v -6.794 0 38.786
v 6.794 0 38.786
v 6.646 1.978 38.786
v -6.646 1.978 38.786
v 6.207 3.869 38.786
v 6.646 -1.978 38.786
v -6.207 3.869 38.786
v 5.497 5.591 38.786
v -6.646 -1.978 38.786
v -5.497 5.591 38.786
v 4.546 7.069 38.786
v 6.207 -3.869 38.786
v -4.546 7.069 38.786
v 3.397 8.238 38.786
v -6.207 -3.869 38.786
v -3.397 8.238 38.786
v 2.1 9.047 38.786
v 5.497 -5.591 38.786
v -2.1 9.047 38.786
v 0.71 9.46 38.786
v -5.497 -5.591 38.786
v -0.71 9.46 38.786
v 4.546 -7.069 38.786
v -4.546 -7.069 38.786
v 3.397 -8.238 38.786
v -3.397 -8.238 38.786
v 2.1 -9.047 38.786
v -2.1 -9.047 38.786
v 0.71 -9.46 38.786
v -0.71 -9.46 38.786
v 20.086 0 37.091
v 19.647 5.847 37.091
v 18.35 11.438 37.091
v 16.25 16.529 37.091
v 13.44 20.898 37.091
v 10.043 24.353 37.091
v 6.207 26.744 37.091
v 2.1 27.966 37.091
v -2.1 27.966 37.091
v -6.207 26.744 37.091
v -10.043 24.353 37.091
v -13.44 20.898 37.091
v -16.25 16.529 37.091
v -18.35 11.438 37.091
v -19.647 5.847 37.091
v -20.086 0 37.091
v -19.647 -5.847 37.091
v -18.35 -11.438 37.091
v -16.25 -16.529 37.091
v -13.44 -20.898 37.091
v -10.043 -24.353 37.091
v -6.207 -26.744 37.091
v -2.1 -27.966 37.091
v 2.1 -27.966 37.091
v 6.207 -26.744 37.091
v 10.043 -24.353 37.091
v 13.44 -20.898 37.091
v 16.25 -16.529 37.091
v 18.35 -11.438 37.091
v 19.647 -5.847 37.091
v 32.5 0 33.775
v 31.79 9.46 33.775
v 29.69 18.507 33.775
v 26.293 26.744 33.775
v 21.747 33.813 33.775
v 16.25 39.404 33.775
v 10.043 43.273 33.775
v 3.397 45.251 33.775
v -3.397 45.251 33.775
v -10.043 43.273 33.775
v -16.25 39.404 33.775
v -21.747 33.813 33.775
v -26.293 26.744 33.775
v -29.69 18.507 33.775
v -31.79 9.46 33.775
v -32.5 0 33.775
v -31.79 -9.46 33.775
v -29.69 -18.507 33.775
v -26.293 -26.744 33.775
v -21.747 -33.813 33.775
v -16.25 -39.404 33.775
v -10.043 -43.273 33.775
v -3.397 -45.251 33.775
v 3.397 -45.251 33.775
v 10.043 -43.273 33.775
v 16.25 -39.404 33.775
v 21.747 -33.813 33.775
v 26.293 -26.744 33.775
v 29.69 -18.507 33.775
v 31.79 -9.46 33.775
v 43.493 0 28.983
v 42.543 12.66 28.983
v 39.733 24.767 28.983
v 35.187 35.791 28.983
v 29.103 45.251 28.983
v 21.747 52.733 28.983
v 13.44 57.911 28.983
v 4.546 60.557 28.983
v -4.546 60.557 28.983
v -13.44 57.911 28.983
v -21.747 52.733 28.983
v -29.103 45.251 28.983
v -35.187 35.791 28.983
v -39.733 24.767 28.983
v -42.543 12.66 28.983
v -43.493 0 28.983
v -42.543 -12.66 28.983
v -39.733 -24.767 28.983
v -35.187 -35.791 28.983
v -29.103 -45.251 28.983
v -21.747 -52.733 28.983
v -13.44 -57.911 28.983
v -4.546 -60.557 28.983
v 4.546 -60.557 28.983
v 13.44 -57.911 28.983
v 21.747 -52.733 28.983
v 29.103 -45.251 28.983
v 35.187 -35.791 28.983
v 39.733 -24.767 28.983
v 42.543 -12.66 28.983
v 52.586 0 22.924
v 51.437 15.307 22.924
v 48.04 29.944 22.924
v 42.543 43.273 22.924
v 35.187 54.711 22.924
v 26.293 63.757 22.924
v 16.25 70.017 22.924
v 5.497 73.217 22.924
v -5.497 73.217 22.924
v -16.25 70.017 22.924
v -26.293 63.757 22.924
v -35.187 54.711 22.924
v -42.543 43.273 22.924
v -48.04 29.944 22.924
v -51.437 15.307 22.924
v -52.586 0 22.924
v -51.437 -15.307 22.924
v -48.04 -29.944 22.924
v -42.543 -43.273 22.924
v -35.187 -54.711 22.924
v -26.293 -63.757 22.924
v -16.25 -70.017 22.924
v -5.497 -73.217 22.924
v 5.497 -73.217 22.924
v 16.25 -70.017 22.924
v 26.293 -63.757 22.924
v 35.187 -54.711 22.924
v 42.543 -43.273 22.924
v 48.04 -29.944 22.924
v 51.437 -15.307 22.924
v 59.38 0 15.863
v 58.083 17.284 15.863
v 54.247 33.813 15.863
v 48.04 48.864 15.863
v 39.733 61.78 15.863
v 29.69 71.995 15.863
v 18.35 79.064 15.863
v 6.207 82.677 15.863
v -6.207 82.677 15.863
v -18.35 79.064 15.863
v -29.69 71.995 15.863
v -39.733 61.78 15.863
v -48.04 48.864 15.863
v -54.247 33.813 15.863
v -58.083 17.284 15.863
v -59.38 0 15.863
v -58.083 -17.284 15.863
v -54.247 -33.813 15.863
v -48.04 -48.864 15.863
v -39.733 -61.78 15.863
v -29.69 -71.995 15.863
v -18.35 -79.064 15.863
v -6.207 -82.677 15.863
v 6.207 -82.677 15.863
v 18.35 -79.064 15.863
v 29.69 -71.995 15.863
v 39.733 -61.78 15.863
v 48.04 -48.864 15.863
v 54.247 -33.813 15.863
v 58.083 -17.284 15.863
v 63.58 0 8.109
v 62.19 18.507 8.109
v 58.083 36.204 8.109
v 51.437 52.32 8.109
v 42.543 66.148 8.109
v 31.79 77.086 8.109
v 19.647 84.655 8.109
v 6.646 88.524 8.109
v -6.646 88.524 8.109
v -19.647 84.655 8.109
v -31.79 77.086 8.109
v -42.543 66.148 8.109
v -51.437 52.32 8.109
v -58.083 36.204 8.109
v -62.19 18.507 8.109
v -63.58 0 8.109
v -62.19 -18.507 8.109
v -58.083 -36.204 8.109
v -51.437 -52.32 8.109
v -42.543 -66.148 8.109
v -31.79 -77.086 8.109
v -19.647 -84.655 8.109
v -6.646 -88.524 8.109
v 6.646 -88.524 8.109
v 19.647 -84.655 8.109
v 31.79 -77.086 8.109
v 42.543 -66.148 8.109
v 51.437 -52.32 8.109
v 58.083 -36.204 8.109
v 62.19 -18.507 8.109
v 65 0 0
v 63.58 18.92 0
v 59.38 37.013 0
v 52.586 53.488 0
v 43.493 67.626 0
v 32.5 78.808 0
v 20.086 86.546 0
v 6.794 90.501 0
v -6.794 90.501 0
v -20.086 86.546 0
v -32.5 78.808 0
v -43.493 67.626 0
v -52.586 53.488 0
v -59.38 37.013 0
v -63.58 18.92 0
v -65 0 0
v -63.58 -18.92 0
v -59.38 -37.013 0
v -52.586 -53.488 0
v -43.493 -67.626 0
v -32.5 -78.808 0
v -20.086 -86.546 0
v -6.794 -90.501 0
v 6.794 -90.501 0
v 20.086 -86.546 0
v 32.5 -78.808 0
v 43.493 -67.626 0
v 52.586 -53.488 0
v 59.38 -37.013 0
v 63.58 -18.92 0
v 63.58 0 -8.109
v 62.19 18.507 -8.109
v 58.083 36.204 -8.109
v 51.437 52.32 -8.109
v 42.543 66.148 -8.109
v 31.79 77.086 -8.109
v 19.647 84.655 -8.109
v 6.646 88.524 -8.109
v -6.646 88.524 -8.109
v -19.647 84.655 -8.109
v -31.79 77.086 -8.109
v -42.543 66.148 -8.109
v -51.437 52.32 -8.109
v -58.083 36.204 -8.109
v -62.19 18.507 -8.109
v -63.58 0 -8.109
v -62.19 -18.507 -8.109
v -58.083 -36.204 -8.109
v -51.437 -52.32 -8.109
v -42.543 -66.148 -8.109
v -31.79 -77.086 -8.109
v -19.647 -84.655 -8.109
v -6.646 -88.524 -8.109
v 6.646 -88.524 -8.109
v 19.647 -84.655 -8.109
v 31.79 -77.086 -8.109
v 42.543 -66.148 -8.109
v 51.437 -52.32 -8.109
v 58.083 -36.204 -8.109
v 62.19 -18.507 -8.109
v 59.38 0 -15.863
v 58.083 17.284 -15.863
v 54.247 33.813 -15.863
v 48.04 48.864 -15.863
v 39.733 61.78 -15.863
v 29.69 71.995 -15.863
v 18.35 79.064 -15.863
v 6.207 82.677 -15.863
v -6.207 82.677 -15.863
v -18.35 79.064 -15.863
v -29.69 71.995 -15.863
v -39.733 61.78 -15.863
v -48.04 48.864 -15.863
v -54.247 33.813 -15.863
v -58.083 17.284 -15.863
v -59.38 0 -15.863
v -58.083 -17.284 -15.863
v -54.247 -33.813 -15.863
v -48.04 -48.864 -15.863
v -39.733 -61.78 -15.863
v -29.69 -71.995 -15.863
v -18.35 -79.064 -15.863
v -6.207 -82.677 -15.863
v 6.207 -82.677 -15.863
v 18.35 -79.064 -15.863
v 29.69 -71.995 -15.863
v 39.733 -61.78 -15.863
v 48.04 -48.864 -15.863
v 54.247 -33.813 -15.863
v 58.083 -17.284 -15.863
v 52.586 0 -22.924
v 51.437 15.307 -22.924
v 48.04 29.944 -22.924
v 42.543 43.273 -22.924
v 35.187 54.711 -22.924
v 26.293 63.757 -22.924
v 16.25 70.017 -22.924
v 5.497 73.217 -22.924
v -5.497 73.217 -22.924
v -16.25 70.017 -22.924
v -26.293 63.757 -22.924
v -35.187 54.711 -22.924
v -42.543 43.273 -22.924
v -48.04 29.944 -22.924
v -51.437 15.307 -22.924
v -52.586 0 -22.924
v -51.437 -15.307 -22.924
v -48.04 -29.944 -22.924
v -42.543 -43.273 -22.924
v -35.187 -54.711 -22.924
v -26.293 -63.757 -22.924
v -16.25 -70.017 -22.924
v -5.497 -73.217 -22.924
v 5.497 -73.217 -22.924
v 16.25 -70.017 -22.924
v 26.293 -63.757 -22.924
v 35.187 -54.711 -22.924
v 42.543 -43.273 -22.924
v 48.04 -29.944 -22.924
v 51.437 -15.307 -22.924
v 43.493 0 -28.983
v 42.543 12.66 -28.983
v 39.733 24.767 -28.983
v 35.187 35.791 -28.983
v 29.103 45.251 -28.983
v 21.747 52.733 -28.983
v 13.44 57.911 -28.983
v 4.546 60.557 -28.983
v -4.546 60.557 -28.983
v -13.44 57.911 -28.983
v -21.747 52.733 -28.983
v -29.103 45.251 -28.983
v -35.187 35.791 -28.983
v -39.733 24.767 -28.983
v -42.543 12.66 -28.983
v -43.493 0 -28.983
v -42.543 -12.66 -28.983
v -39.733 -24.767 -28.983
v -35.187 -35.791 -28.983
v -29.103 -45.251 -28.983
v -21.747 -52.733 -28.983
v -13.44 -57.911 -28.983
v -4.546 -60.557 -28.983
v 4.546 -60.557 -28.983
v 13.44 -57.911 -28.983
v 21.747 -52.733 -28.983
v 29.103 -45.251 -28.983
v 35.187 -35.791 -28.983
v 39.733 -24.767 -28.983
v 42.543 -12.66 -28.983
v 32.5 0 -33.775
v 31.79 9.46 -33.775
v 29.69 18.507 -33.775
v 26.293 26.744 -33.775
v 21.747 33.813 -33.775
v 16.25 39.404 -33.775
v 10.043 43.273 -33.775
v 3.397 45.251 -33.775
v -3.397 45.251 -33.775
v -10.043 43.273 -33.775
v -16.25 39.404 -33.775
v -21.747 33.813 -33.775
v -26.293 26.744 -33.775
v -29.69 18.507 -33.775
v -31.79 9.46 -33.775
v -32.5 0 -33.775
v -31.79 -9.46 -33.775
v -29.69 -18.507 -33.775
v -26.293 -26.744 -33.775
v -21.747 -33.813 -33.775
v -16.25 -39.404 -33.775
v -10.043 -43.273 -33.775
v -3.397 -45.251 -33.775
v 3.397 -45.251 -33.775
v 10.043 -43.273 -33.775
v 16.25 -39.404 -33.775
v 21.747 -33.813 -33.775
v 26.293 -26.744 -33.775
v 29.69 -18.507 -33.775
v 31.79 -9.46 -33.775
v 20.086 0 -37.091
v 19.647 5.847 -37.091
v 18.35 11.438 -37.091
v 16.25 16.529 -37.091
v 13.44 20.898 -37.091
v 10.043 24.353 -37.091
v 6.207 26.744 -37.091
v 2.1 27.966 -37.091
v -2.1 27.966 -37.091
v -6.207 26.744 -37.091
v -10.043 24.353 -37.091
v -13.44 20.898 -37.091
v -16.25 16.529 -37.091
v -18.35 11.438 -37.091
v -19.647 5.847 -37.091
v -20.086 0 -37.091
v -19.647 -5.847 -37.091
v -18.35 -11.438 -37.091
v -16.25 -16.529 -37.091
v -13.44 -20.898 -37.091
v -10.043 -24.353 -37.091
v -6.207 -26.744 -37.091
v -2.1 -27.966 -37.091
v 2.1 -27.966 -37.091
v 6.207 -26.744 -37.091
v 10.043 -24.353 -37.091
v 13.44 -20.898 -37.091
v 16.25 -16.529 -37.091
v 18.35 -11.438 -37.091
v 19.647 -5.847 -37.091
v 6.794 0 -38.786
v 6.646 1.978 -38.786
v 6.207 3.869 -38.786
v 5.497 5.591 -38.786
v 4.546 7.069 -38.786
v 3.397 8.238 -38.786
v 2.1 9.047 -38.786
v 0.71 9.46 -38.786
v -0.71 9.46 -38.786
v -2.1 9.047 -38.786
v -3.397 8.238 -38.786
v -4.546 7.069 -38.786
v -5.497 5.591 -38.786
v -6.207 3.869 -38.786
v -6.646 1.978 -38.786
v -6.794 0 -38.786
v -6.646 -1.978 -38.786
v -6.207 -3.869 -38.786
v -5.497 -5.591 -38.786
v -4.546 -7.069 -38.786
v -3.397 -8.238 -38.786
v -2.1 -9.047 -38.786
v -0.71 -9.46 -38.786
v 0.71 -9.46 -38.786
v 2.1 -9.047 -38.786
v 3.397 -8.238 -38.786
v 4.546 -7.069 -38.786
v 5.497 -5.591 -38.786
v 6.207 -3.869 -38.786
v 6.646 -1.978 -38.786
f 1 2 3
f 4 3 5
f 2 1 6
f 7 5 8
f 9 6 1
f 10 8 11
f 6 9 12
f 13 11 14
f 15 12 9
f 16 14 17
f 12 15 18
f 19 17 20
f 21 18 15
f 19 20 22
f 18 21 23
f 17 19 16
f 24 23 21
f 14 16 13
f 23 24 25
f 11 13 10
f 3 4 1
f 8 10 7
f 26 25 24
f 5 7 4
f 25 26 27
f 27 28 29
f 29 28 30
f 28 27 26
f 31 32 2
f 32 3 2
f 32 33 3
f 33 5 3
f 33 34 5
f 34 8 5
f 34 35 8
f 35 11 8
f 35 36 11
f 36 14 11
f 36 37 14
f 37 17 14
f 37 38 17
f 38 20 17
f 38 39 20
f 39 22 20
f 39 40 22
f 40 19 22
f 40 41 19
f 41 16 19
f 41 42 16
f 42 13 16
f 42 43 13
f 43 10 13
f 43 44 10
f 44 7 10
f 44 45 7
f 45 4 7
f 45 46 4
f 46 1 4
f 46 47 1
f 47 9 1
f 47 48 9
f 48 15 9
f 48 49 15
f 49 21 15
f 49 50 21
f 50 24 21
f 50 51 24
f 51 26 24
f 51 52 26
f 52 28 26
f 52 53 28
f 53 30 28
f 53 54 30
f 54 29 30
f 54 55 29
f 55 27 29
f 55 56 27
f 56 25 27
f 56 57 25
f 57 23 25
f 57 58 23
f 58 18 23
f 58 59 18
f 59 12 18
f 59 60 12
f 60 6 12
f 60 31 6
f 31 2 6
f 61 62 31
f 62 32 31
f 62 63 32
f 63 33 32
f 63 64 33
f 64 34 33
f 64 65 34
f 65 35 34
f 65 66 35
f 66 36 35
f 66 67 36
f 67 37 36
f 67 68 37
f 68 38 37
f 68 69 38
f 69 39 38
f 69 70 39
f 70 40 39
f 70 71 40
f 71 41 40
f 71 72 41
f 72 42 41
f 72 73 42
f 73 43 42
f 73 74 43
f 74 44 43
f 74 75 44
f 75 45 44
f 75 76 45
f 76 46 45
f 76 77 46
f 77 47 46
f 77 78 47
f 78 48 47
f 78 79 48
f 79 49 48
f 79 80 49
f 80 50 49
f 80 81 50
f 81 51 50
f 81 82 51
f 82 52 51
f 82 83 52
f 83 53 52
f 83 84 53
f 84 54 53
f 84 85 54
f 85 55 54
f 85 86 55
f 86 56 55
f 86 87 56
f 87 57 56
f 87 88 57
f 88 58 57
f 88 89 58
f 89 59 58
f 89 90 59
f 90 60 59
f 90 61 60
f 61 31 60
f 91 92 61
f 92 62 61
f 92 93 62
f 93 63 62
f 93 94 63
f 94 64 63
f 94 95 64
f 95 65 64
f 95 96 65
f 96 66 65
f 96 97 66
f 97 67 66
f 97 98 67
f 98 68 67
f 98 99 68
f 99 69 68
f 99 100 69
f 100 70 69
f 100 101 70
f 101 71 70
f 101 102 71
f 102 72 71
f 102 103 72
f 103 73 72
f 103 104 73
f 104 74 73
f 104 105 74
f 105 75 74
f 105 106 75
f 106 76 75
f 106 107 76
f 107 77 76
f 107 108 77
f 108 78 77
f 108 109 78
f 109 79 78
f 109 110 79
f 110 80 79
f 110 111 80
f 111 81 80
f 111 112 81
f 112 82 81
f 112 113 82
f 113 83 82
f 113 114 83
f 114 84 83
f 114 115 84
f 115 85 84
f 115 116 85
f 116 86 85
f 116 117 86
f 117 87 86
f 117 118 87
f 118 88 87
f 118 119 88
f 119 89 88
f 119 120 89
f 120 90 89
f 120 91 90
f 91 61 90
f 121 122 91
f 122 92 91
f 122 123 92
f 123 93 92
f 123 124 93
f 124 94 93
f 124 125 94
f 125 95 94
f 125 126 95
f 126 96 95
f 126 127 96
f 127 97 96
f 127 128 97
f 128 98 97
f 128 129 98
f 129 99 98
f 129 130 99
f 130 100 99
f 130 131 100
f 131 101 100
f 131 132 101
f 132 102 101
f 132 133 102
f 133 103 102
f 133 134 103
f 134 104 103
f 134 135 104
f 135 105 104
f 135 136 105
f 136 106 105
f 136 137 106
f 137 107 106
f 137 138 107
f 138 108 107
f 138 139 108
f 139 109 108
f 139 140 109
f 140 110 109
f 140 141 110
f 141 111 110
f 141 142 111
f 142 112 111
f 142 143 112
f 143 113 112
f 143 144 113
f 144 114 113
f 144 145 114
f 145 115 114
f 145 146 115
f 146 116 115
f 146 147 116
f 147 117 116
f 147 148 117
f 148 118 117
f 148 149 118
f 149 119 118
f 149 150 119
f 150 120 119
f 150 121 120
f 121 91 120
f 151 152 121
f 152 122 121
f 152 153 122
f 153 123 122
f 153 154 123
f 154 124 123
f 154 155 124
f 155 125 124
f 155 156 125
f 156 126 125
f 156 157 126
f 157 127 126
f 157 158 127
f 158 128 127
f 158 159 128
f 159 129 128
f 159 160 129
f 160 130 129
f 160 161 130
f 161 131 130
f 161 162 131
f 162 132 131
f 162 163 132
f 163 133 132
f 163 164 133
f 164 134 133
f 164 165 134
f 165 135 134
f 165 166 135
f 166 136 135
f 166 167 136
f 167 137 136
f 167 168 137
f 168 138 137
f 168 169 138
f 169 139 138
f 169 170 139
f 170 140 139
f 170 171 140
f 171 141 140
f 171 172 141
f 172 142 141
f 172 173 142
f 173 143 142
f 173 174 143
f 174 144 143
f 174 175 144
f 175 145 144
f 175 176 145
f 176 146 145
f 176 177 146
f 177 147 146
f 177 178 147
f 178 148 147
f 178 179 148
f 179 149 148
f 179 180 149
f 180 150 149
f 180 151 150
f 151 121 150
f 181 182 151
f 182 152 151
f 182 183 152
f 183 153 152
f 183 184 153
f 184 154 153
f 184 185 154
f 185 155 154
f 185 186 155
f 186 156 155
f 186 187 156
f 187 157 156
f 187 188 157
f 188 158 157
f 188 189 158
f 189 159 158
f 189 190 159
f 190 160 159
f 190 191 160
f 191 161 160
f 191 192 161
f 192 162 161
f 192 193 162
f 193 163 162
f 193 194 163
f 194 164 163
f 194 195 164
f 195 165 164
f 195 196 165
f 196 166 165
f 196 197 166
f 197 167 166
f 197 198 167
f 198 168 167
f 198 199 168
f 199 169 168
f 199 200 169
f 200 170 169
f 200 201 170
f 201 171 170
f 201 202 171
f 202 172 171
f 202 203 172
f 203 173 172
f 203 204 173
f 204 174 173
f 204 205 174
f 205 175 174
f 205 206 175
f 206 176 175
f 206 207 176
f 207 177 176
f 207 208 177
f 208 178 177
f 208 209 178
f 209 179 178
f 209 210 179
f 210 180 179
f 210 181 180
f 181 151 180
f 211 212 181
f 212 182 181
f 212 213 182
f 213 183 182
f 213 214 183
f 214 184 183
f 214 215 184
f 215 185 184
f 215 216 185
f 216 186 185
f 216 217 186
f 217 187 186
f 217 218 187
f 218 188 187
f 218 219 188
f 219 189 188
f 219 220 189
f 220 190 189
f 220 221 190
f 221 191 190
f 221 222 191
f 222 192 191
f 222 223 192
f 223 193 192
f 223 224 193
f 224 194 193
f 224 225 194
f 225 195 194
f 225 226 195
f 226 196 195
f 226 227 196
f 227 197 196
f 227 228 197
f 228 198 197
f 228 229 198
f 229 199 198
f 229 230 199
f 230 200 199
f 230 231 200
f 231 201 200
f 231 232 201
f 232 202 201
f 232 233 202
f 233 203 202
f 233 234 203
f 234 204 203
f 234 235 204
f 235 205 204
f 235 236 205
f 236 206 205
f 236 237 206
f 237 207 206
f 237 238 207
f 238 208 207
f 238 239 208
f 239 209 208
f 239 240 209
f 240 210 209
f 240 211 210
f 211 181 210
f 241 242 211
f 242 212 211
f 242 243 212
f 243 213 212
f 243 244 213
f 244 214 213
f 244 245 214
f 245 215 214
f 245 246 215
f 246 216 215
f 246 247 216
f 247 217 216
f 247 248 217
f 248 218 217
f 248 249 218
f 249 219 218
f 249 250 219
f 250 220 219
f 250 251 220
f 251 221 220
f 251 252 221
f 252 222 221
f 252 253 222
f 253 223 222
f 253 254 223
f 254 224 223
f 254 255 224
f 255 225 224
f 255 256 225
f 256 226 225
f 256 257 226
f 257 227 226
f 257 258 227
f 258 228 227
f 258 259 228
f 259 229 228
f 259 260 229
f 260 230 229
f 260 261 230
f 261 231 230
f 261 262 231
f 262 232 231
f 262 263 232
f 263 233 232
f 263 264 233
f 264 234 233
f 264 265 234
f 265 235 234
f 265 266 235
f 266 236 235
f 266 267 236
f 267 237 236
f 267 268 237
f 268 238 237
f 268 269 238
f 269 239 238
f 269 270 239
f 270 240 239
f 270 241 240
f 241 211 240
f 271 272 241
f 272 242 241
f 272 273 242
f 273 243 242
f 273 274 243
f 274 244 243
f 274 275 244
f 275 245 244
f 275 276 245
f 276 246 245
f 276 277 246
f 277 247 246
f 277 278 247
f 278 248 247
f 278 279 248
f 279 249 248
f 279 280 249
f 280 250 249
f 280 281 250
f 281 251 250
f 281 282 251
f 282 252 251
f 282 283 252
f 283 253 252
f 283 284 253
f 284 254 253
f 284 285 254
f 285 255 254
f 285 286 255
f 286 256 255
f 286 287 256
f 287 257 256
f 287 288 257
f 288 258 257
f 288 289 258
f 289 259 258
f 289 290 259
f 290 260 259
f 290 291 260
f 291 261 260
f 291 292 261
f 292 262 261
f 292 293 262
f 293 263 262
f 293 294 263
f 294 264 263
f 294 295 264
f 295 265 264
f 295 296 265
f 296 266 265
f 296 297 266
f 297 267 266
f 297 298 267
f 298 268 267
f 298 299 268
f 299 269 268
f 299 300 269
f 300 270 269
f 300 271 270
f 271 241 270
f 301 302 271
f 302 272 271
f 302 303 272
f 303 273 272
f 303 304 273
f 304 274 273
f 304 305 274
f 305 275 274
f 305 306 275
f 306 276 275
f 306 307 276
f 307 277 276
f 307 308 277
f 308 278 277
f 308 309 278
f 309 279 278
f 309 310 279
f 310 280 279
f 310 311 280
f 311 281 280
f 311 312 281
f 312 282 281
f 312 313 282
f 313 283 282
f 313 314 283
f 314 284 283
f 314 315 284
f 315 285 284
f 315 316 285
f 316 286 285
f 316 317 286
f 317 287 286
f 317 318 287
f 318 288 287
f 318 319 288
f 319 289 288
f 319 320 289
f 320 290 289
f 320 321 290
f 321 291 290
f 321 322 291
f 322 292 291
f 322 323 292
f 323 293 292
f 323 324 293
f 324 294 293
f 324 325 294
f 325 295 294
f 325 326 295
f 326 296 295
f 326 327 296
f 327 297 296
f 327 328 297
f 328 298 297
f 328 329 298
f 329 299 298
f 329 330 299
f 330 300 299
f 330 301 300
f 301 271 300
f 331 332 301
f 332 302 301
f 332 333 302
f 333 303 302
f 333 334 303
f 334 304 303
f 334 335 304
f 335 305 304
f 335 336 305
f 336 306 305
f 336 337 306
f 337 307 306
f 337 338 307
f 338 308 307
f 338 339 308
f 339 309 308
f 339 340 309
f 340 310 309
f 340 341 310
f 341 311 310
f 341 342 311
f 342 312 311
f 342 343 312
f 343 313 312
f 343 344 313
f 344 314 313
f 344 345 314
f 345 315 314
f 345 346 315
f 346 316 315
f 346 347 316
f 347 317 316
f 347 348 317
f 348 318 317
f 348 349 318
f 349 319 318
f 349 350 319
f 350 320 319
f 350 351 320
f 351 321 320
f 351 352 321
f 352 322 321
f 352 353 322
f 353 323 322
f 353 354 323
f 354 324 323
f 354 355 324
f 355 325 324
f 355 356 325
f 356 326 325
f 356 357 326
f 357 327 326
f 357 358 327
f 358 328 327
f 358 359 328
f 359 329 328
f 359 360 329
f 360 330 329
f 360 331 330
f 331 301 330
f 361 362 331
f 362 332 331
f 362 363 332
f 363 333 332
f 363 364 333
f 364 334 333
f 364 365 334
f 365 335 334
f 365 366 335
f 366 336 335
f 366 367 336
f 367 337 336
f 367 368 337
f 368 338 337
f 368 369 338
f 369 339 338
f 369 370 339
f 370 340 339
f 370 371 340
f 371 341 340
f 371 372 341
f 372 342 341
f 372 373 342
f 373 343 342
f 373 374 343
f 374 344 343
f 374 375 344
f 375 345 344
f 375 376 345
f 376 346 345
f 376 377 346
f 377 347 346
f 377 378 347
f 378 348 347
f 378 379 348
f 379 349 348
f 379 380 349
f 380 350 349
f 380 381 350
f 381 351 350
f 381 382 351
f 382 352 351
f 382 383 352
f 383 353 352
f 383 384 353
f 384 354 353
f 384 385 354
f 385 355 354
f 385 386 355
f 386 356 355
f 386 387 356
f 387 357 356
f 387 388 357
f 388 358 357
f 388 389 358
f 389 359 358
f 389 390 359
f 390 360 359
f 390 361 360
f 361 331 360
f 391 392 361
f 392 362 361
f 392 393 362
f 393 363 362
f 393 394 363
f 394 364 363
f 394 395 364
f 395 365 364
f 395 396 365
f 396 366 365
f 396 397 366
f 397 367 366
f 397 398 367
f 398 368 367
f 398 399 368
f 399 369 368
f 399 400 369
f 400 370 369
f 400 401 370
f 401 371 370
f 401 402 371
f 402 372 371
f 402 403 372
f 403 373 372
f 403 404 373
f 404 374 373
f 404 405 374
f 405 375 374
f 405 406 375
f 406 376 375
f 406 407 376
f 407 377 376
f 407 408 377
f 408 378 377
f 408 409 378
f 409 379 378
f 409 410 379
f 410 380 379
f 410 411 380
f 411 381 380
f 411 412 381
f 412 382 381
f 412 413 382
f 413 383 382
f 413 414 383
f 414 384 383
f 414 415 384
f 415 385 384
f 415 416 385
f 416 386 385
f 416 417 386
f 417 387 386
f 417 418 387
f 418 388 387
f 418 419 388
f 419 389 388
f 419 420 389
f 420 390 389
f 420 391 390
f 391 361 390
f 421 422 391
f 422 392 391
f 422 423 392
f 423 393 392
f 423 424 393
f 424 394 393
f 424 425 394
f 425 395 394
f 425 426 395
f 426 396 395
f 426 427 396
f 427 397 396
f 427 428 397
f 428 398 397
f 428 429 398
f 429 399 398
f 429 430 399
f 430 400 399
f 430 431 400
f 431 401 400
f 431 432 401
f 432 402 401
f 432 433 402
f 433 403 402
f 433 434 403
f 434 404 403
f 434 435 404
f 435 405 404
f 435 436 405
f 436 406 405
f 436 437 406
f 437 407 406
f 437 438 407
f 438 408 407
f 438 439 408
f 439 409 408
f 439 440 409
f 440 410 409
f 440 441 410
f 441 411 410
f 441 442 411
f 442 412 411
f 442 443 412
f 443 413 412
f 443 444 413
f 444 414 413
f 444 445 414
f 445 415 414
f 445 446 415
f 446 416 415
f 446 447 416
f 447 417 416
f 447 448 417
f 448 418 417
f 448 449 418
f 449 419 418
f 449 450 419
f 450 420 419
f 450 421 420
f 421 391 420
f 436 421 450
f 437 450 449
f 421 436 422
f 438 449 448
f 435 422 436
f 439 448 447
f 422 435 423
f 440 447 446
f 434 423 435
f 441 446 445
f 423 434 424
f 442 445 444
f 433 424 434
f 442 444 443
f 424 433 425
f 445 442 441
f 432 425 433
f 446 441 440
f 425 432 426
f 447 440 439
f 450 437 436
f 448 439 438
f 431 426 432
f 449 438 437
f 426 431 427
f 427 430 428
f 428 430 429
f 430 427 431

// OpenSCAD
// Generated by SolidPython 1.0.1 on 2020-07-29 00:46:46


scale(v = [5, 7, 3]) {
	sphere(r = 13);
}
/***********************************************
*********      SolidPython code:      **********
************************************************
 
# import packages: SolidPython
from solid import *
from solid.utils import *
from itertools import chain, combinations, permutations


class Resize:

    def __init__(self, scad_file):
        self.scad_file = scad_file
        #self.scad_file = import_scad(scad_file)
        # cone/cylinder param:
        self.r1 = 0
        self.r2 = 0
        self.h = 0
        # rectangular prism param:
        self.w = 0
        self.l = 0
        # ellipse param:
        self.r = 0

    # import OpenScad code (file name corresponds to shape)


    # classify shape + parameters
    def assign(self, param1, param2, param3):
        if self.scad_file == 'cone.scad':
            self.r1 = param1
            self.r2 = param2
            self.h = param3
        elif self.scad_file == 'cylinder.scad':
            self.r1 = param1
            self.r2 = param2
            self.h = param3
        elif self.scad_file == 'rectangularPrism.scad':
            self.h = param1
            self.l = param2
            self.w = param3
        else:
            self.r = param1
            self.h = param2

    # resize parameters
    def iterate(self):
        x = range(3, 20, 2)
        i = 1
        if self.scad_file == 'cone.scad':
            tempList = list(permutations(x, 2))
            for temp in tempList:
                param1 = temp[0]
                param2 = temp[1]
                filepath = 'produced_scad_files/' + 'cone' + str(param1) + '_' + str(param2) + '_' + '.scad'
                scad_render_to_file(cylinder(h=param1, r1=param2, r2=0), filepath)

        elif self.scad_file == 'cylinder.scad':
            tempList = list(permutations(x, 3))
            for temp in tempList:
                param1 = temp[0]
                param2 = temp[1]
                filepath = 'produced_scad_files/' + 'cylinder' + str(param1) + '_' + str(param2) + '_' + '.scad'
                scad_render_to_file(cylinder(h=param1, r1=param2, r2=param2), filepath)

        elif self.scad_file == 'rectangularPrism.scad':
            tempList = list(permutations(x, 3))
            for temp in tempList:
                param1 = temp[0]
                param2 = temp[1]
                param3 = temp[2]
                filepath = 'produced_scad_files/' + 'rectangularPrism' + str(param1) + '_' + str(param2) + '_' + str(
                    param3) + '.scad'
                scad_render_to_file(cube(size=(param1, param2, param3)), filepath)

        elif self.scad_file == 'ellipse.scad':
            tempList = list(permutations(x, 4))
            for temp in tempList:
                param1 = temp[0]
                param2 = temp[1]
                param3 = temp[2]
                param4 = temp[3]
                filepath = 'produced_scad_files/' + 'ellipse' + str(param1) + '_' + str(param2) + '_' + str(param3) + '_' + str(param4) + '.scad'
                scad_render_to_file(scale([param1, param2, param3])(sphere(r=param4)), filepath)

    def render_to_scadfile(self):
        scad_render_to_file(scad, 'example.scad') 
 
************************************************/
